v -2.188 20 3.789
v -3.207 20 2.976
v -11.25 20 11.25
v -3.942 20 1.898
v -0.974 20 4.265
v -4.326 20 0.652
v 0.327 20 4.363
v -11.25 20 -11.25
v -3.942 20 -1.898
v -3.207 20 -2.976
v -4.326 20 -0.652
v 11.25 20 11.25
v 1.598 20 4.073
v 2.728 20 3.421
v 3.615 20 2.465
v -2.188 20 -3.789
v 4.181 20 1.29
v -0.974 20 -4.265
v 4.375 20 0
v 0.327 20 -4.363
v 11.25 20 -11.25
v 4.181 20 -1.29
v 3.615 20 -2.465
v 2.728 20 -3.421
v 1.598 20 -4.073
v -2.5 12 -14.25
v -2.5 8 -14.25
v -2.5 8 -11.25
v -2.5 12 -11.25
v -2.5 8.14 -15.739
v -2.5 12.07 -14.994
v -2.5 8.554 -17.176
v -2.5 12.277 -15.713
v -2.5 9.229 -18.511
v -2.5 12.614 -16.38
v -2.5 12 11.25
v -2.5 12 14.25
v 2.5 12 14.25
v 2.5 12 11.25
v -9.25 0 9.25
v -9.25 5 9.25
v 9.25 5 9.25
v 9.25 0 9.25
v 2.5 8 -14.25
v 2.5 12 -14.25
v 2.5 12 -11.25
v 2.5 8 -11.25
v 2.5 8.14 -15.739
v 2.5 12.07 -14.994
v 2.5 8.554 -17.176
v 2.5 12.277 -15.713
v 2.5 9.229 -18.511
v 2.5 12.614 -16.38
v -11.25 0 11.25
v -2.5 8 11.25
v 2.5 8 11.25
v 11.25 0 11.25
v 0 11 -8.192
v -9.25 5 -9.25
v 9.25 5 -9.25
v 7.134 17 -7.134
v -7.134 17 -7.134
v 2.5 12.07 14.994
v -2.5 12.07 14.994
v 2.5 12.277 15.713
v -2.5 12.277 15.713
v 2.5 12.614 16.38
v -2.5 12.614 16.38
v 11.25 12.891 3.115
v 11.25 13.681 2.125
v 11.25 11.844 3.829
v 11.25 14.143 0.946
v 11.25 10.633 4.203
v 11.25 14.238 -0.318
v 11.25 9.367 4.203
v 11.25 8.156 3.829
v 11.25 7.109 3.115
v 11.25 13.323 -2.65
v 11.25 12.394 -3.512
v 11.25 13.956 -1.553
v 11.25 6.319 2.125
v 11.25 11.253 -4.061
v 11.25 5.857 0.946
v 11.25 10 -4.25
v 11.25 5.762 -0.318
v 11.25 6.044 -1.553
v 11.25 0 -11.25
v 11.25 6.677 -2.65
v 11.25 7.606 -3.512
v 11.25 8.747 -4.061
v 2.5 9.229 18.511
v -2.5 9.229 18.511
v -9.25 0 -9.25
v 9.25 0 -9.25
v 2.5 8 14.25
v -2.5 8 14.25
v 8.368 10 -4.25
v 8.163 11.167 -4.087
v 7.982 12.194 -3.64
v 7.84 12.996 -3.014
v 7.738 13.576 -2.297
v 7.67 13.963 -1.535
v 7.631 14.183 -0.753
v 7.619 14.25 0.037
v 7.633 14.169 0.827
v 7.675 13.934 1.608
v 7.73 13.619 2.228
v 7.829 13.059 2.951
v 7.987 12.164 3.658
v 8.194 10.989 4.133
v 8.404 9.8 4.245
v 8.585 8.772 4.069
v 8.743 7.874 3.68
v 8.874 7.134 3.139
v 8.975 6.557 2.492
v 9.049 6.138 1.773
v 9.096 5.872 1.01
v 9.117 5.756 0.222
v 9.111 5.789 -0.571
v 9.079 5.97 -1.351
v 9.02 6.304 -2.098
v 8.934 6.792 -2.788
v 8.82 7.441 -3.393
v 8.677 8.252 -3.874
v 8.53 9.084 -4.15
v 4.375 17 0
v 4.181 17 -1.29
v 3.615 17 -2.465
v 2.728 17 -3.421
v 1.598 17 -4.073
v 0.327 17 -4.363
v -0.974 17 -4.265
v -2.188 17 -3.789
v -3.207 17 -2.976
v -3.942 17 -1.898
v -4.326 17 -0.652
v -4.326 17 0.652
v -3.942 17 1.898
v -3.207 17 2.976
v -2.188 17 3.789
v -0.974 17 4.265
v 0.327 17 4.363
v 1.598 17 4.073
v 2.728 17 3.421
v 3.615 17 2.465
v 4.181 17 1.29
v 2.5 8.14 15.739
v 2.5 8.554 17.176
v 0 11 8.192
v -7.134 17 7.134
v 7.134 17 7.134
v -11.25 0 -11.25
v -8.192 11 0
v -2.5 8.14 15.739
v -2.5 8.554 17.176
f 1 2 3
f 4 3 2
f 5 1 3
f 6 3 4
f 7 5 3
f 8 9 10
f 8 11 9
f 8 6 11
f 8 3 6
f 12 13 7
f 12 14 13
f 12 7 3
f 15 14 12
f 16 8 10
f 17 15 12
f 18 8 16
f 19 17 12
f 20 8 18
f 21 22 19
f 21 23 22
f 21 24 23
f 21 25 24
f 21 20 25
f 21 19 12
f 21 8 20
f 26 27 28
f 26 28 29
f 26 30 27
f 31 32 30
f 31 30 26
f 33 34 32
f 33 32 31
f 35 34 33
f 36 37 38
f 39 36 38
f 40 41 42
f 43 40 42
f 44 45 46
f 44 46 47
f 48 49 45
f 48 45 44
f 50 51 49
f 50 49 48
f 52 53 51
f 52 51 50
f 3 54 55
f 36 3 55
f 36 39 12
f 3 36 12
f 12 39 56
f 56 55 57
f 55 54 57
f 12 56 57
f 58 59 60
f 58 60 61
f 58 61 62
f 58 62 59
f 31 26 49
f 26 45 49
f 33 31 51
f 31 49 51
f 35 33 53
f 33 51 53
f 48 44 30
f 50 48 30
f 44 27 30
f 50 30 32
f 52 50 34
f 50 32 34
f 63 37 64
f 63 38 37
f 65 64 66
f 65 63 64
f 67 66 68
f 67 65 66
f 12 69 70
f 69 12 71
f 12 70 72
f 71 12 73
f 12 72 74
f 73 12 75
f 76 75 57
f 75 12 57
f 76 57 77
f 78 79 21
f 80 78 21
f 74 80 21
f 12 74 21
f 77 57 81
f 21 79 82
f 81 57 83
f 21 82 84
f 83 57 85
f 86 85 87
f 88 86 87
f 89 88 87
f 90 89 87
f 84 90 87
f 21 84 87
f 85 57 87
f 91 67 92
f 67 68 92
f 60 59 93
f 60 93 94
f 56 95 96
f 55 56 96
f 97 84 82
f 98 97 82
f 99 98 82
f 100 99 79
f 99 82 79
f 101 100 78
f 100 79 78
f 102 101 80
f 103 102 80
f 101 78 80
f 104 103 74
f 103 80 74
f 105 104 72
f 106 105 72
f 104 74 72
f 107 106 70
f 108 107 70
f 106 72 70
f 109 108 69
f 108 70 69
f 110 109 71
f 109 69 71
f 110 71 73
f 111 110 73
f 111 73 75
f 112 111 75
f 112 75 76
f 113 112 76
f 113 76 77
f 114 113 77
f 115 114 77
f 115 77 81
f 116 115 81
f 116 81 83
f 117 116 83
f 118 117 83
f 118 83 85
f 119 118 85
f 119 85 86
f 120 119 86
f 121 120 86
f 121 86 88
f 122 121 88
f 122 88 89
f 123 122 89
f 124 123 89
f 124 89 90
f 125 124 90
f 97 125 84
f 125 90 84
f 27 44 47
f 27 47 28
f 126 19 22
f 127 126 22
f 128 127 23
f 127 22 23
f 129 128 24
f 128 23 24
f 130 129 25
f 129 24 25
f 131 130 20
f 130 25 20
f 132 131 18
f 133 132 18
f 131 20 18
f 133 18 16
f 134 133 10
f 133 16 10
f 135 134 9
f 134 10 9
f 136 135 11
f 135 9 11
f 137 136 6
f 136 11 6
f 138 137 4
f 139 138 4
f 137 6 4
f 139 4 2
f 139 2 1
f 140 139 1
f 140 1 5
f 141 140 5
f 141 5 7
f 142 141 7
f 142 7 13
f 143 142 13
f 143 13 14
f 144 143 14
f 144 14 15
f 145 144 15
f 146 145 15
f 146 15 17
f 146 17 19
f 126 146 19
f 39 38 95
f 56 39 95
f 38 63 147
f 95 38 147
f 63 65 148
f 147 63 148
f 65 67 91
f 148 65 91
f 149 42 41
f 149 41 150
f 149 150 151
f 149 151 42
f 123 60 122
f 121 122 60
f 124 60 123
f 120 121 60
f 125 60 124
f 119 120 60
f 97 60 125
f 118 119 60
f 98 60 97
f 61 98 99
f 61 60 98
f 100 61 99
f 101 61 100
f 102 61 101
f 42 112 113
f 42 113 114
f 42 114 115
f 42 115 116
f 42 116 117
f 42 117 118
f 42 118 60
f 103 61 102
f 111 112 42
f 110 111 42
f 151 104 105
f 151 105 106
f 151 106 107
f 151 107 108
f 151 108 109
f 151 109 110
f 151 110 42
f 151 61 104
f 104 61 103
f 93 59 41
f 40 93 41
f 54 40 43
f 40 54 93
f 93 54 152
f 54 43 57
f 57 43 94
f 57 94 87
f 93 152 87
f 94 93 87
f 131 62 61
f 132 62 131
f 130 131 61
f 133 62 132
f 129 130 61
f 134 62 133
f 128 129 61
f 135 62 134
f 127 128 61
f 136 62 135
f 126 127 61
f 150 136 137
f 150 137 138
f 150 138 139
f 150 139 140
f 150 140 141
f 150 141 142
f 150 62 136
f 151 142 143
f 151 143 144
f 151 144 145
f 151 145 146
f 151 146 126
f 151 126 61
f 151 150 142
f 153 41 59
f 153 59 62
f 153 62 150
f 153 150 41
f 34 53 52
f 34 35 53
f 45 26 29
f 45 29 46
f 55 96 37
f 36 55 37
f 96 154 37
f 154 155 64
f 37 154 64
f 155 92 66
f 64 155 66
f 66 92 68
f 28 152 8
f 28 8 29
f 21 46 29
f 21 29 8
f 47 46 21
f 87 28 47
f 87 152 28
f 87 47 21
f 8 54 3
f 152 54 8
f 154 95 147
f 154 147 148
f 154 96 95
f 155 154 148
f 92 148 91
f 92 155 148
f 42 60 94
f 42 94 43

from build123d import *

# Parameters (mm, degrees)
SKETCH1_W                    = 22.5
SKETCH1_H                    = 22.5
BOSS_EXTRUDE1_DEPTH          = 20
CUT_EXTRUDE1_START           = -5
SKETCH3_W                    = 18.5
SKETCH3_H                    = 18.5
CUT_EXTRUDE1_DEPTH           = 12
CUT_EXTRUDE1_TAPER           = 10
CUT_EXTRUDE1_OTHER_WAY_DEPTH = 5
CUT_EXTRUDE2_REACH           = 22
SKETCH2_R                    = 4.375
CUT_EXTRUDE3_REACH           = 24.5
SKETCH4_R                    = 4.25
SKETCH5_W                    = 5
SKETCH5_H                    = 4


with BuildPart() as part:
    # Sketch1 → Boss-Extrude1 (new body)
    with BuildSketch(Plane(origin=(0, 0, 0), x_dir=(1, 0, 0), z_dir=(0, 1, 0))):
        Rectangle(SKETCH1_W, SKETCH1_H)
    extrude(amount=BOSS_EXTRUDE1_DEPTH)

    # Sketch3 → Cut-Extrude1 (cut)
    with BuildSketch(Plane.XZ.offset(CUT_EXTRUDE1_START)):
        Rectangle(SKETCH3_W, SKETCH3_H)
    extrude(amount=-CUT_EXTRUDE1_DEPTH, taper=CUT_EXTRUDE1_TAPER, mode=Mode.SUBTRACT)

    # Sketch3 → Cut-Extrude1 other way (cut)
    with BuildSketch(Plane.XZ.offset(CUT_EXTRUDE1_START)):
        Rectangle(SKETCH3_W, SKETCH3_H)
    extrude(amount=CUT_EXTRUDE1_OTHER_WAY_DEPTH, mode=Mode.SUBTRACT)

    # Sketch2 → Cut-Extrude2 (cut, up to next)
    with BuildSketch(Plane(origin=(0, 20, 0), x_dir=(1, 0, 0), z_dir=(0, 1, 0)), mode=Mode.PRIVATE) as cut_extrude2_sk1:
        Circle(SKETCH2_R)
    cut_extrude2_tool1 = extrude(cut_extrude2_sk1.sketch, amount=-CUT_EXTRUDE2_REACH, mode=Mode.PRIVATE) & part.part
    add(cut_extrude2_tool1.solids().sort_by_distance((0, 20, 0))[0], mode=Mode.SUBTRACT)

    # Sketch4 → Cut-Extrude3 (cut, up to next)
    with BuildSketch(Plane(origin=(11.25, 0, 0), x_dir=(0, 0, -1), z_dir=(1, 0, 0)), mode=Mode.PRIVATE) as cut_extrude3_sk1:
        with Locations((0, 10)):
            Circle(SKETCH4_R)
    cut_extrude3_tool1 = extrude(cut_extrude3_sk1.sketch, amount=-CUT_EXTRUDE3_REACH, mode=Mode.PRIVATE) & part.part
    add(cut_extrude3_tool1.solids().sort_by_distance((11.25, 10, 0))[0], mode=Mode.SUBTRACT)

    # Sweep1: sweep along a path in Sketch6
    with BuildLine(Plane(origin=(0, 0, 0), x_dir=(0, 0, -1), z_dir=(1, 0, 0))) as sweep1_path:
        Line((11.25, 10), (14.25, 10))
        ThreePointArc((14.25, 10), (15.912838742, 10.235022349), (17.445409396, 10.921677561))
    # Sketch5 → Sweep1 (sweep)
    with BuildSketch(Plane(origin=(0, 0, -11.25), x_dir=(-1, 0, 0), z_dir=(0, 0, -1))):
        with Locations((0, 10)):
            Rectangle(SKETCH5_W, SKETCH5_H)
    sweep1 = sweep(path=sweep1_path.line)

    # Mirror1: Sweep1 across plane
    add(sweep1.mirror(Plane.XY))


solid = part.part
